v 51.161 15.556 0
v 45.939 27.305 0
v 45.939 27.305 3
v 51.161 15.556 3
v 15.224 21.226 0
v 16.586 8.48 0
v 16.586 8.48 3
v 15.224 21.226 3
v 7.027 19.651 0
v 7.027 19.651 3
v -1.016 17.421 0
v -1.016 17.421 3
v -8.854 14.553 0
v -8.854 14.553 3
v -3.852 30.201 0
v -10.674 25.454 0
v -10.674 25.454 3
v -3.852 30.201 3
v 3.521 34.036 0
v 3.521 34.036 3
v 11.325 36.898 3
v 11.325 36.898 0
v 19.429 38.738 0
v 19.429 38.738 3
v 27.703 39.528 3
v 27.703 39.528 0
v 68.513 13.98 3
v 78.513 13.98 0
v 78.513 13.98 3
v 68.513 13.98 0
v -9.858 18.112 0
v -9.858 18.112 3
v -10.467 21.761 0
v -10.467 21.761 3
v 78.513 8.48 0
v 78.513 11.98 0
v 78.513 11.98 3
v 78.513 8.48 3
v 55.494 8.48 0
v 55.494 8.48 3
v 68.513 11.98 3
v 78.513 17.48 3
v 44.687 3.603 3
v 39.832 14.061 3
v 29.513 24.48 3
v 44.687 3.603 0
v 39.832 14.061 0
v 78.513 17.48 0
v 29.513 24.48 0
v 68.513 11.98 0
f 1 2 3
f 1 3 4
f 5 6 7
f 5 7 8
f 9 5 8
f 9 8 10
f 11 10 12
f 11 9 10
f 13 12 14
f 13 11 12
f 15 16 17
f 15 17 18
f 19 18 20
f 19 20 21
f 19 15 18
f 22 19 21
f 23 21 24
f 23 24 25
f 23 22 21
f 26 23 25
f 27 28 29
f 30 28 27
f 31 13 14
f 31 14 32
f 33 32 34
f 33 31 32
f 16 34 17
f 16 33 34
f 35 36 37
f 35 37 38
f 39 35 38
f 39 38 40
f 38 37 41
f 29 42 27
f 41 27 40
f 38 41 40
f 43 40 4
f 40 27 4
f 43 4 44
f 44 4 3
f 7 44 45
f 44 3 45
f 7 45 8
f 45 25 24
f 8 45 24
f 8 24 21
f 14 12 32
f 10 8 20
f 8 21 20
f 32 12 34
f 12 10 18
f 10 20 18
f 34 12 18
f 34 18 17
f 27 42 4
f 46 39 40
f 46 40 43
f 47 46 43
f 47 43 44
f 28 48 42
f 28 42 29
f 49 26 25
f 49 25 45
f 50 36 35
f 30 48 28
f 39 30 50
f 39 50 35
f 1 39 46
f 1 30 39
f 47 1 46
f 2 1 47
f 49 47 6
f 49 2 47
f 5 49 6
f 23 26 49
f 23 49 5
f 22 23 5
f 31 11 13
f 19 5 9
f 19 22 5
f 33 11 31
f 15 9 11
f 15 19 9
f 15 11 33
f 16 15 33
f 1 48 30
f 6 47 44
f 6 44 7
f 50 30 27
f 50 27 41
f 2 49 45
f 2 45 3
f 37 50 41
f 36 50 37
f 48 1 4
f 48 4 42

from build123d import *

# Parameters (mm, degrees)
SALIENTE_EXTRUIR1_DEPTH = 3


with BuildPart() as part:
    # Model → Saliente-Extruir1 (new body)
    with BuildSketch(Plane.XY):
        with BuildLine():
            Line((78.512585392, 8.480394017), (67.503193542, 8.480394017))
            Line((67.503193542, 8.480394017), (55.493801692, 8.480394017))
            Line((55.493801692, 8.480394017), (44.687089166, 3.603222324))
            Line((44.687089166, 3.603222324), (39.831918887, 14.06059302))
            Line((39.831918887, 14.06059302), (16.586059329, 8.480394017))
            Line((16.586059329, 8.480394017), (15.223673977, 21.22645362))
            ThreePointArc((15.223673977, 21.22645362), (2.983166863, 18.616670486), (-8.854222662, 14.552535688))
            ThreePointArc((-8.854222662, 14.552535688), (-10.212878112, 19.928241742), (-10.673926914, 25.453781916))
            ThreePointArc((-10.673926914, 25.453781916), (7.377127931, 35.592311556), (27.703067566, 39.527605983))
            Line((27.703067566, 39.527605983), (29.512585392, 24.480394017))
            Line((29.512585392, 24.480394017), (45.938881991, 27.30453113))
            Line((45.938881991, 27.30453113), (51.161258051, 15.555534113))
            Line((51.161258051, 15.555534113), (78.512585392, 17.480394017))
            Line((78.512585392, 17.480394017), (78.512585392, 13.980394017))
            Line((78.512585392, 13.980394017), (68.512585392, 13.980394017))
            Line((68.512585392, 13.980394017), (68.512585392, 11.980394017))
            Line((68.512585392, 11.980394017), (78.512585392, 11.980394017))
            Line((78.512585392, 11.980394017), (78.512585392, 8.480394017))
        make_face()
    extrude(amount=SALIENTE_EXTRUIR1_DEPTH)


solid = part.part
